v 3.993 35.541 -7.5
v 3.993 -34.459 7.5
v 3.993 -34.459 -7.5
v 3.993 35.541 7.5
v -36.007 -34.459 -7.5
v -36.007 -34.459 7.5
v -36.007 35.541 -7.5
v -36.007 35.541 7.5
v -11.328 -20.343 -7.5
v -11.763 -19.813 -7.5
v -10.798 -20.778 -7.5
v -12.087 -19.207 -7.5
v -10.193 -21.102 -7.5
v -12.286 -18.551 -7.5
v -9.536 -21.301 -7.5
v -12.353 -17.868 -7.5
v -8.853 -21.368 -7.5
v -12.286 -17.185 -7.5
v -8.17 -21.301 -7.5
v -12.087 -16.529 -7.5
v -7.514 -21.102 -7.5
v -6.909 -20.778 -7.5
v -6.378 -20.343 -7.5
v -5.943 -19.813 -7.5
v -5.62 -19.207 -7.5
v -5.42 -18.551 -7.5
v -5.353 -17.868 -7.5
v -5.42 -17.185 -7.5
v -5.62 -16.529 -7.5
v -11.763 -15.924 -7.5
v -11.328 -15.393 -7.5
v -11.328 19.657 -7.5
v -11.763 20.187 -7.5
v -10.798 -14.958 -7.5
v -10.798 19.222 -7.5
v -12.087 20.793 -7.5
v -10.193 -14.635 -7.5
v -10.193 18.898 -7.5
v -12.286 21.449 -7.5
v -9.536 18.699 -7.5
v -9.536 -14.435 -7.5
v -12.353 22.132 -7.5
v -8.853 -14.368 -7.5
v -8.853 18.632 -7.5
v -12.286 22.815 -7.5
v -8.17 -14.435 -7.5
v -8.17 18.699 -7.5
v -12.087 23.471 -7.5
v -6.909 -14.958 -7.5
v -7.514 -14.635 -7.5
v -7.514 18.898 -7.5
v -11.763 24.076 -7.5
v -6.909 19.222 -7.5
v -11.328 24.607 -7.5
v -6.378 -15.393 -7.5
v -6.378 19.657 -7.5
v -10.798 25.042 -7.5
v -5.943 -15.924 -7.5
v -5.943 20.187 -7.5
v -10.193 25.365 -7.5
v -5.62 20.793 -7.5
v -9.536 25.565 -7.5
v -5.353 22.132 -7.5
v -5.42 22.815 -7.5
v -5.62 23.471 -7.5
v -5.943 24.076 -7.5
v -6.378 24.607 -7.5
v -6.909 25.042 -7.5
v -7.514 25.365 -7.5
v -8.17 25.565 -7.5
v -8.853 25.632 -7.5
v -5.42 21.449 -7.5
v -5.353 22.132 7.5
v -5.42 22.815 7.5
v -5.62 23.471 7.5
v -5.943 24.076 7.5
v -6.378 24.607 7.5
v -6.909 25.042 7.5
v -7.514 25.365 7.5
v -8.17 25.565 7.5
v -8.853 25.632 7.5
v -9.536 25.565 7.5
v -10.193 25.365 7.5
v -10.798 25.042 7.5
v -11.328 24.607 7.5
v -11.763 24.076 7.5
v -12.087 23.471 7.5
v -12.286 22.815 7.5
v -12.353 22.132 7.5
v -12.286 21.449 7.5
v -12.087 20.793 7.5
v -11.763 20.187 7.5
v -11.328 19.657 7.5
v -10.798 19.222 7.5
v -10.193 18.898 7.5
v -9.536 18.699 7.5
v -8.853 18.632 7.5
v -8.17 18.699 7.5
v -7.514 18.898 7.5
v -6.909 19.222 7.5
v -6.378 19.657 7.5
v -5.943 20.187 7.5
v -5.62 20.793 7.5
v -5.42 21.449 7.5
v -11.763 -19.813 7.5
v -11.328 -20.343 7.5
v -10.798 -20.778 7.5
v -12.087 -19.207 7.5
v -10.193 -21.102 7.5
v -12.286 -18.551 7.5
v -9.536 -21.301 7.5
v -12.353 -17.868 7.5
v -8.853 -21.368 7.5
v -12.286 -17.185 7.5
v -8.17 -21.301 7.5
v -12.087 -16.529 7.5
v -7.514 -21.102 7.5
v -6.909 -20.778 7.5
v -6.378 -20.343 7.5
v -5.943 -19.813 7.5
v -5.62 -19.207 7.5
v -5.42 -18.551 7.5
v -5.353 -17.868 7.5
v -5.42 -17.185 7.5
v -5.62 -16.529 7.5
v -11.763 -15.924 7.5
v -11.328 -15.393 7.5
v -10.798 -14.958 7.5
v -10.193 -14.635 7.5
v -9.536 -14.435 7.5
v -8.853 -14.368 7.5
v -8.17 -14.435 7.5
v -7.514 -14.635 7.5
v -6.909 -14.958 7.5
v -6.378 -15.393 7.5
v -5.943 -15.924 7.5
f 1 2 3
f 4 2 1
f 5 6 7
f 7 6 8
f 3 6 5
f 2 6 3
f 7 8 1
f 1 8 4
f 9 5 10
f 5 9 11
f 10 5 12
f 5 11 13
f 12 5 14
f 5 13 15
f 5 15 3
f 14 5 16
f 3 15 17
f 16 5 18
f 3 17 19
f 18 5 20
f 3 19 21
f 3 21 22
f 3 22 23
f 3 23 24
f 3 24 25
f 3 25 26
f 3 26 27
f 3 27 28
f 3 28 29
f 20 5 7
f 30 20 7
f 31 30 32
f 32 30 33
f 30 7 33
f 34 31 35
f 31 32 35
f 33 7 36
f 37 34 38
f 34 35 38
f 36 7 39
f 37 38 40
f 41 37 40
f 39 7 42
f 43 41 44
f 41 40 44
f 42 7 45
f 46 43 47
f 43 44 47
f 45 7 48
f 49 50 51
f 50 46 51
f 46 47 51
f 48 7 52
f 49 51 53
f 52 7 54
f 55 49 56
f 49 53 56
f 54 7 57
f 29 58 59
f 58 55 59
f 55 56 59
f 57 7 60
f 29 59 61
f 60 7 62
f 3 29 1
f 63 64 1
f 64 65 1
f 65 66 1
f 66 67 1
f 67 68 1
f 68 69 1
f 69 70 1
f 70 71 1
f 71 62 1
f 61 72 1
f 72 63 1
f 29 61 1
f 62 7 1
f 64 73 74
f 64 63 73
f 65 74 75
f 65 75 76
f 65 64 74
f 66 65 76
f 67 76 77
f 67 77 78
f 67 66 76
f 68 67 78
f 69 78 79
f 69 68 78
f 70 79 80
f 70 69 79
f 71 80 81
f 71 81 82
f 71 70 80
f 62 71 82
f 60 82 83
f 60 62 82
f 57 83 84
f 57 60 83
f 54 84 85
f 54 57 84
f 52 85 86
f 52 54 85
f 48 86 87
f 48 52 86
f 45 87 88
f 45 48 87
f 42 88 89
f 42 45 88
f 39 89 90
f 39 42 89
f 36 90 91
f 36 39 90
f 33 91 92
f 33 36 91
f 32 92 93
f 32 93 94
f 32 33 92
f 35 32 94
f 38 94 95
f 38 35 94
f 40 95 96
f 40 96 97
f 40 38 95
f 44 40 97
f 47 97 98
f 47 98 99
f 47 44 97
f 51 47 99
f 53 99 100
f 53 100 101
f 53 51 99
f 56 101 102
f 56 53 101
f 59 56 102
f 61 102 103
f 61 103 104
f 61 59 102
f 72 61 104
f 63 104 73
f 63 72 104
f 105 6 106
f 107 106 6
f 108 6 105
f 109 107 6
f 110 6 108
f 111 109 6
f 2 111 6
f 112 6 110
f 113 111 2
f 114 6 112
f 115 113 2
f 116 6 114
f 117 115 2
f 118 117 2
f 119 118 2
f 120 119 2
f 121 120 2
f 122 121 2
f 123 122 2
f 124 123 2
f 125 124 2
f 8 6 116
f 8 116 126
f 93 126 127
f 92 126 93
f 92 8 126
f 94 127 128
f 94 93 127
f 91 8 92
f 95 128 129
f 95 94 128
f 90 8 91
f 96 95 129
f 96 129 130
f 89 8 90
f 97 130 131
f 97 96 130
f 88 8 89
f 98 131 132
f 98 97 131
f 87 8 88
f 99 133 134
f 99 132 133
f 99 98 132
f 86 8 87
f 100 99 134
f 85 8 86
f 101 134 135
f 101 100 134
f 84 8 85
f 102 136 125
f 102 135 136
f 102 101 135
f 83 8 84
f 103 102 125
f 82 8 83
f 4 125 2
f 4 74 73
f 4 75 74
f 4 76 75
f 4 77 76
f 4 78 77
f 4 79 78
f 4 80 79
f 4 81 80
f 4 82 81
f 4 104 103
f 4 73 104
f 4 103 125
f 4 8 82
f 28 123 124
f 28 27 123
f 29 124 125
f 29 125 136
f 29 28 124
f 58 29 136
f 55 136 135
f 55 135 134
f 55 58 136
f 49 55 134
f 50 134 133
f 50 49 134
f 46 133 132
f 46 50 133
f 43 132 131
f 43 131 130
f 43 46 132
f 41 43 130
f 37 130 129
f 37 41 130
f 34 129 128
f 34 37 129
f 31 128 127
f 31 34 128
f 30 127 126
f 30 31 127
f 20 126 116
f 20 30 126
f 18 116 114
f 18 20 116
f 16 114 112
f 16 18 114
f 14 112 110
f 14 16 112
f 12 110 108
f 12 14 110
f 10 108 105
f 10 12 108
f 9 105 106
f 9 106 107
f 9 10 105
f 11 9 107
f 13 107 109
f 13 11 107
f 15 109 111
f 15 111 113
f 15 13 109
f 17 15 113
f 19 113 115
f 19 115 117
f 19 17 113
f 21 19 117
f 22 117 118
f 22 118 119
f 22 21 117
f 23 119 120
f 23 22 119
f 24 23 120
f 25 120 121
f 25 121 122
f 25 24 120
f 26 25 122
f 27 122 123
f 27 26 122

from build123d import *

# Parameters (mm, degrees)
F0_W     = 40
F0_H     = 70
F0_R     = 3.5
F1_DEPTH = 7.5


with BuildPart() as f1:
    # F0 (on Top) → F1 (new body, symmetric)
    with BuildSketch(Plane.XY):
        with Locations((-16.007383, 0.540901)):
            Rectangle(F0_W, F0_H)
        with Locations((-8.853193, -17.868106)):
            Circle(F0_R, mode=Mode.SUBTRACT)
        with Locations((-8.853193, 22.131894)):
            Circle(F0_R, mode=Mode.SUBTRACT)
    extrude(amount=F1_DEPTH, both=True)


solid = f1.part
